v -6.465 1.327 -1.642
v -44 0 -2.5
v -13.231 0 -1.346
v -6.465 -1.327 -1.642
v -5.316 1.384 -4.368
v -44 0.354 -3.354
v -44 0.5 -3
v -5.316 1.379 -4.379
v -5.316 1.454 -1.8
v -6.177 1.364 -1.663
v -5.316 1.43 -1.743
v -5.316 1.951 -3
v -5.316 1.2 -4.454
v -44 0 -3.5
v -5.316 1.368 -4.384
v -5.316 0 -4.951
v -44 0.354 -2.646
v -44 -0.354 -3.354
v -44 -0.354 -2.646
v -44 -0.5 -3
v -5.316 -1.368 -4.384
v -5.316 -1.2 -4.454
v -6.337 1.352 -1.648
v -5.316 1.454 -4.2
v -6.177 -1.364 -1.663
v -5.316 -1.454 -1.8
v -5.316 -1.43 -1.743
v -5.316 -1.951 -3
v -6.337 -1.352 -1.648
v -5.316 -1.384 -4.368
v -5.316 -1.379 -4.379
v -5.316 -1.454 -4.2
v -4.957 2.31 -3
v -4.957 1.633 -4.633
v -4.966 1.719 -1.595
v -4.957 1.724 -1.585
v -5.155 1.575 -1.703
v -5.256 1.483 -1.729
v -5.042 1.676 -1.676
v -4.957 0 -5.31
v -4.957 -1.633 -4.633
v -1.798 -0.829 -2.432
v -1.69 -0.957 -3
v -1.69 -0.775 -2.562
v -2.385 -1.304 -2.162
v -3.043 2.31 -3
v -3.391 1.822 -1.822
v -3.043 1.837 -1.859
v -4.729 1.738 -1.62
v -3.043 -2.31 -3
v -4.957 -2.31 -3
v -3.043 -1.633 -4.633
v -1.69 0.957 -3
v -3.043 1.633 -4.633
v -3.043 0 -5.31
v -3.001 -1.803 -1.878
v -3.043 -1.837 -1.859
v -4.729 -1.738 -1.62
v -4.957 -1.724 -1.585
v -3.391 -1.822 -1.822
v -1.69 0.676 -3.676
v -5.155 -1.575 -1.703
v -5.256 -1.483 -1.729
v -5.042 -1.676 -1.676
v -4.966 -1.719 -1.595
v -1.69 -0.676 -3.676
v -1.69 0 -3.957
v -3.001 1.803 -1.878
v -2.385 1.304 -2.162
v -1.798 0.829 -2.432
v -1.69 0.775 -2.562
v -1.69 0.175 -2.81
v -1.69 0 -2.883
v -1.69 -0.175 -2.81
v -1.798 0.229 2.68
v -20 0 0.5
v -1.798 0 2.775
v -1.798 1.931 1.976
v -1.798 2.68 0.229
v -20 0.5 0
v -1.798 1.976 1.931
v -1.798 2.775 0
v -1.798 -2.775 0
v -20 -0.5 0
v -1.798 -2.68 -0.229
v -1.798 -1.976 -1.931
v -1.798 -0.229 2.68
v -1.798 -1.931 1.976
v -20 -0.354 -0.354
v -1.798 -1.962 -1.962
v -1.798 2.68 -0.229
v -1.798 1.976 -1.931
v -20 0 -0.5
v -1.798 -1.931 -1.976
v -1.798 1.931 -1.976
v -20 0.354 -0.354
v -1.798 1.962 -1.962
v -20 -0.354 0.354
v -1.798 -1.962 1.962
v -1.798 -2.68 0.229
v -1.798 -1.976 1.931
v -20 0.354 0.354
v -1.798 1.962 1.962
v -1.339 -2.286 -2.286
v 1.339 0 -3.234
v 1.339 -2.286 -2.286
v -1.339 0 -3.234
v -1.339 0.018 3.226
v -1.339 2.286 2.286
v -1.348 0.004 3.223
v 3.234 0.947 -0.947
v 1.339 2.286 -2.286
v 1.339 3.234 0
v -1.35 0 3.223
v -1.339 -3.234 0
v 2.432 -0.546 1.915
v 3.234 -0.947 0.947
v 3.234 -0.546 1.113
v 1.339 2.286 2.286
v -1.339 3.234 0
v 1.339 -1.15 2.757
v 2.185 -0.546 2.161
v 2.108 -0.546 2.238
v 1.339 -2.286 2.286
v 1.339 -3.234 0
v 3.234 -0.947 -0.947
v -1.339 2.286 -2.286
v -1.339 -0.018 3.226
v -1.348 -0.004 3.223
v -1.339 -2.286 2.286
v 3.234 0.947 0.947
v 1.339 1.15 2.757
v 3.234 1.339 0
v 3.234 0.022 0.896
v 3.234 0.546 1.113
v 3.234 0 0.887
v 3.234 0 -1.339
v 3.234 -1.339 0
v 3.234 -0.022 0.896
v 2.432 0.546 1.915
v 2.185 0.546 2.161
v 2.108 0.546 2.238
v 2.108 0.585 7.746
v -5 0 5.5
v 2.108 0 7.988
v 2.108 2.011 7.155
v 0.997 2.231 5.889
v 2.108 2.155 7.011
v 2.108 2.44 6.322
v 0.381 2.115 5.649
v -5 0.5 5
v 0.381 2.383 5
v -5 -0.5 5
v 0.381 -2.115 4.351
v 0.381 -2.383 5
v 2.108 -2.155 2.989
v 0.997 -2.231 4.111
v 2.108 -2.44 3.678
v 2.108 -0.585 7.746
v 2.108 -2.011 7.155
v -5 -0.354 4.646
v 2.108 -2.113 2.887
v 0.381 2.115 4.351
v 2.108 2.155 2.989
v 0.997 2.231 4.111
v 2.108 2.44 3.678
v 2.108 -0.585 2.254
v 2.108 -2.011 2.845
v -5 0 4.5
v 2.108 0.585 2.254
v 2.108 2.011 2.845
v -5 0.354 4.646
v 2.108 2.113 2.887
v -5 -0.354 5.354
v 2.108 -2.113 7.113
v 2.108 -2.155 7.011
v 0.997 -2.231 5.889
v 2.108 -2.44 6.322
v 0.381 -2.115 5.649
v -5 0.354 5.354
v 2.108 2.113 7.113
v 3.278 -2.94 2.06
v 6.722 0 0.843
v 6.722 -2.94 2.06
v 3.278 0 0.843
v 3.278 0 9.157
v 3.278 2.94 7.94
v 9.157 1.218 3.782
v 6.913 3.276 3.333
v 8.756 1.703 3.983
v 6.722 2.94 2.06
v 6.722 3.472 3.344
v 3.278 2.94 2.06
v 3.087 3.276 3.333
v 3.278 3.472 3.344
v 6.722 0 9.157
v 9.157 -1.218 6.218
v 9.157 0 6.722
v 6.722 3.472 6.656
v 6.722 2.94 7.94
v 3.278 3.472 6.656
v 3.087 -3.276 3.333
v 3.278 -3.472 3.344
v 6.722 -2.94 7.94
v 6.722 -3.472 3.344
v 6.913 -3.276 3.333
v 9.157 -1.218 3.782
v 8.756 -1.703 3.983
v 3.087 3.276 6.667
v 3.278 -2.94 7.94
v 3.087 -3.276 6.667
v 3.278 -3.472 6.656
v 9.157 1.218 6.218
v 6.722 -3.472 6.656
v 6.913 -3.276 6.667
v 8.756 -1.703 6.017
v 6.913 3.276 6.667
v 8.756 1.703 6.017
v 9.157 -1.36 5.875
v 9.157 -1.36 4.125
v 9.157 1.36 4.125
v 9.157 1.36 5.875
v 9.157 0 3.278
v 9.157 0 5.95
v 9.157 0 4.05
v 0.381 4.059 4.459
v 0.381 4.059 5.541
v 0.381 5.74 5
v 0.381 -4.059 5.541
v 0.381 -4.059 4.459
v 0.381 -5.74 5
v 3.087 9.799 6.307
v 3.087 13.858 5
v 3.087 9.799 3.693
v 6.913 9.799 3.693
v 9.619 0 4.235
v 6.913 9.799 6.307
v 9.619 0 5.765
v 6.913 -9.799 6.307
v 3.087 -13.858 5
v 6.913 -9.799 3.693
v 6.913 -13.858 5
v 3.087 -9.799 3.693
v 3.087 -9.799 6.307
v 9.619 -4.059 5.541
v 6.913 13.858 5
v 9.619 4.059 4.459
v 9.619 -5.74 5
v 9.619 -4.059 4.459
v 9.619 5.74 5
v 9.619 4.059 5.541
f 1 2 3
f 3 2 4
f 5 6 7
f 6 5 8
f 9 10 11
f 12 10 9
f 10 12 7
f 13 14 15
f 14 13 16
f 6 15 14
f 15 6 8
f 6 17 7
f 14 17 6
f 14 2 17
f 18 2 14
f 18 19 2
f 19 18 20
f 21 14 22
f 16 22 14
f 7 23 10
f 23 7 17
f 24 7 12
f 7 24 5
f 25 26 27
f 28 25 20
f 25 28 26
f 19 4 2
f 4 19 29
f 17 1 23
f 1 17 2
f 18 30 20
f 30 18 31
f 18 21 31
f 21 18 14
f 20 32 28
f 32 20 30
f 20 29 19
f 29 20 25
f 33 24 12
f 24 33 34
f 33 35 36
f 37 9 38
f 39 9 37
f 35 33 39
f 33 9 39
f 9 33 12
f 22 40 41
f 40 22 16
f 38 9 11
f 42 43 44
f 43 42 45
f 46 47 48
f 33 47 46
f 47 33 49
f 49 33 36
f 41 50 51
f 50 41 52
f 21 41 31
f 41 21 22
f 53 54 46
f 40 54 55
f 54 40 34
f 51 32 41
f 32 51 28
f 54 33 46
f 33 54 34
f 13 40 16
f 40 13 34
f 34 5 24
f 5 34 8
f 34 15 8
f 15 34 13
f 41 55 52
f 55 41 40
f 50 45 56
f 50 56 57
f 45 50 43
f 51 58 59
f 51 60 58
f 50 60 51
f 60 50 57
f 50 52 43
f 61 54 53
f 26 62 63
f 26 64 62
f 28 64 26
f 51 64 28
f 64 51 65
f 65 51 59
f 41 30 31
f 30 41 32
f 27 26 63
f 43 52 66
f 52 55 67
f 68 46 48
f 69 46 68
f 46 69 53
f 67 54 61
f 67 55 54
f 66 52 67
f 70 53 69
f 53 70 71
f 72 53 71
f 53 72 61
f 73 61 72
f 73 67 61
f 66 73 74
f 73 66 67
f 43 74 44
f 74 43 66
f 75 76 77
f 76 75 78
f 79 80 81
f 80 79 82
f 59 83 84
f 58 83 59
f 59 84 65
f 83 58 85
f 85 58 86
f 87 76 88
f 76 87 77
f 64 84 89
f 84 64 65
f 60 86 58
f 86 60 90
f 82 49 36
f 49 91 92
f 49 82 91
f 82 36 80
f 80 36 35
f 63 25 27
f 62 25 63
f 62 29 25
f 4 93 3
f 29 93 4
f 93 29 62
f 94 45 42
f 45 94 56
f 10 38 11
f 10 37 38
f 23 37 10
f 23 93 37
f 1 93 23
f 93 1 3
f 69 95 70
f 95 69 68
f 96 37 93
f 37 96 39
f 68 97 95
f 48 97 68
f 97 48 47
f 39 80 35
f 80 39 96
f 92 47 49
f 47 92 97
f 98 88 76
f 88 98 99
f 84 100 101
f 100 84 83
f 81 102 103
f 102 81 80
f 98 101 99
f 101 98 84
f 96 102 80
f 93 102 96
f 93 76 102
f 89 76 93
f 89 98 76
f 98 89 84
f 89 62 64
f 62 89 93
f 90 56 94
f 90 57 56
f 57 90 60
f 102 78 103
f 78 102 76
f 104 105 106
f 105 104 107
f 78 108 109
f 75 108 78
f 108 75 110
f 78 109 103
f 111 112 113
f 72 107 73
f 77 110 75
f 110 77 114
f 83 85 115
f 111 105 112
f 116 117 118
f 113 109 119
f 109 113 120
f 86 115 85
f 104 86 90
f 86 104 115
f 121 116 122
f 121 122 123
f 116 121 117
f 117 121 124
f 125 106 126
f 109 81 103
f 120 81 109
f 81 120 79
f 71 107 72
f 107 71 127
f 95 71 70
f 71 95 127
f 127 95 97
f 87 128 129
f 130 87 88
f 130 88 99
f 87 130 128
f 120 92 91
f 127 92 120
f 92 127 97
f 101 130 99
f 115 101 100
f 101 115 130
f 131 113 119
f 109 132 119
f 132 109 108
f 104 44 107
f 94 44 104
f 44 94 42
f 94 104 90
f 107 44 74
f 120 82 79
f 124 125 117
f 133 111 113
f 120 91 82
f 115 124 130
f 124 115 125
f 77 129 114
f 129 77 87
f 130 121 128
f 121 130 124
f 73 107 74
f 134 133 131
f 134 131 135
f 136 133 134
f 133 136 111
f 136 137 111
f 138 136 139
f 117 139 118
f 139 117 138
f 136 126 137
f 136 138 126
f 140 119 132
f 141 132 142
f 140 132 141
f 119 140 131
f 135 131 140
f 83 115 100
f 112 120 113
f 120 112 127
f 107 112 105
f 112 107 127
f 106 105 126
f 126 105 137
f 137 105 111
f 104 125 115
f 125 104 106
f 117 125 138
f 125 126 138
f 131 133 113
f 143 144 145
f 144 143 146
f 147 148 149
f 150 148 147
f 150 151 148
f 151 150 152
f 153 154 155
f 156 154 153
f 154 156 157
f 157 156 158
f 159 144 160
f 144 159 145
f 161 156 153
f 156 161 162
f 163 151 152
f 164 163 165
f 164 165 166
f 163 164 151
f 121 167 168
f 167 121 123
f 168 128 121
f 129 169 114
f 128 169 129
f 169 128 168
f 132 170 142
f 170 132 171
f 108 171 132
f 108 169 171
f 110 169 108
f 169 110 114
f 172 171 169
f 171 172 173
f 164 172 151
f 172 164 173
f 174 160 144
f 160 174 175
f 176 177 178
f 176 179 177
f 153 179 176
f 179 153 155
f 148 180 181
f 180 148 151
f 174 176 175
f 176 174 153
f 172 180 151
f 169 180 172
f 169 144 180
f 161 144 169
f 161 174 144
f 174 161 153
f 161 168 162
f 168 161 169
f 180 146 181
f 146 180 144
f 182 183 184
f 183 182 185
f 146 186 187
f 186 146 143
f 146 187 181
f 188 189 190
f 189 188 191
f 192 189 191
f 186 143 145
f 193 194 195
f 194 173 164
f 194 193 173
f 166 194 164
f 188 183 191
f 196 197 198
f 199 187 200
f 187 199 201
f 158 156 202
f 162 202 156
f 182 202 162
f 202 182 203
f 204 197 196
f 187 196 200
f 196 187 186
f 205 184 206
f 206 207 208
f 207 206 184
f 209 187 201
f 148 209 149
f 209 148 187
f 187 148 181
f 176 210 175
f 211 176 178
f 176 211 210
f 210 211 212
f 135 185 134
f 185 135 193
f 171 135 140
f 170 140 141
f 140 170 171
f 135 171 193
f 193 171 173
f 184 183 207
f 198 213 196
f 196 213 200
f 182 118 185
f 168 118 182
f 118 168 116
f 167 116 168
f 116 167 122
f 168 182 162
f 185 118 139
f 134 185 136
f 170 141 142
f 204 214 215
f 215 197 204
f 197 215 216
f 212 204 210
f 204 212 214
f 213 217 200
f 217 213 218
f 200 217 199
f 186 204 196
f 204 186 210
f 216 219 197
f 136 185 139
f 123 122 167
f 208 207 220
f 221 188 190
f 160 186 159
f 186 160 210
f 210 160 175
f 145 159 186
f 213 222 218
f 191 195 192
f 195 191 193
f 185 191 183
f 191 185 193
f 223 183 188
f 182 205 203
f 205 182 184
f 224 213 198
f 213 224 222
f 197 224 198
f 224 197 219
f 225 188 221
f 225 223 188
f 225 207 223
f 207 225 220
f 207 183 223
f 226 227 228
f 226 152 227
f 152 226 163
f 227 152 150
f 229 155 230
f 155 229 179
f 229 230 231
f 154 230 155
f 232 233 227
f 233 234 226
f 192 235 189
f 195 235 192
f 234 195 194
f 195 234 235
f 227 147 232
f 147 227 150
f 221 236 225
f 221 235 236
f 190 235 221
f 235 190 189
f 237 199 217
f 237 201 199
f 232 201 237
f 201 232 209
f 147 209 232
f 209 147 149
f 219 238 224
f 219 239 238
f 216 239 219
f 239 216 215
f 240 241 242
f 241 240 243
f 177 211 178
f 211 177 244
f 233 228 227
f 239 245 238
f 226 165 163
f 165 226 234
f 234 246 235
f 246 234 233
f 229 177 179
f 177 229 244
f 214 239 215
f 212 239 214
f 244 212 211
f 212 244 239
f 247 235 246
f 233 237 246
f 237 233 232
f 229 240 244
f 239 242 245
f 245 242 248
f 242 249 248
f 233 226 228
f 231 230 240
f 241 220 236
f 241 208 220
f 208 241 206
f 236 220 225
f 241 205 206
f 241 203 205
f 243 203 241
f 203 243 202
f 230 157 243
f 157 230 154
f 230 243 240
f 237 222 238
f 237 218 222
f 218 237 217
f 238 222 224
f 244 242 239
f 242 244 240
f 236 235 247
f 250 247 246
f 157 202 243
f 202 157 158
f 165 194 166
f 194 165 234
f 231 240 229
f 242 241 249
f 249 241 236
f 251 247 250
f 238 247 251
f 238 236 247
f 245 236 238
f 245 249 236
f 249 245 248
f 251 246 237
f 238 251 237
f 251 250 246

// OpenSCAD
module battlestar()
{
	union() {
	translate(v = [5, 0, 0]) {
		cylinder(h = 40, r1 = 2, r2 = 0.5); 
		sphere(r = 2.5);
	}
	translate(v = [8, 0, -4]) {
		cylinder(h = 20, r1 = 3, r2 = 0.5); 
		sphere(r = 3.5);
	}
	translate(v = [13, 0, -9]) {
		cylinder(h = 10, r1 = 4, r2 = 0.5); 
		sphere(r = 4.5);
		scale(v = [0.2, 1.5, 0.5])
		sphere(r = 10);
	}
	}
}

$fn=8;

rotate(a = 0, v = [0, 0, 1])
rotate(a = -90, v = [0, 1, 0])
translate(v = [-8, 0, 4])
battlestar();
